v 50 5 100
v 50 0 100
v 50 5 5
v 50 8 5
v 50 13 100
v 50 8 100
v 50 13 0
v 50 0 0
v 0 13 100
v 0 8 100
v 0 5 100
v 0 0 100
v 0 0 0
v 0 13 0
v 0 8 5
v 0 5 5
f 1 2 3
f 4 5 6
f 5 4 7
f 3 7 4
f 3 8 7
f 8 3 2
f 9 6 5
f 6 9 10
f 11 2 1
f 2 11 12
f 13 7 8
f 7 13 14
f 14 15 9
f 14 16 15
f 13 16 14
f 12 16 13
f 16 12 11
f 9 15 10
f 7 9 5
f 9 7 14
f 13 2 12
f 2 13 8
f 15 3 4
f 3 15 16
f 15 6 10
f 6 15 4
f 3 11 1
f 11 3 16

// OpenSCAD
// width of the slot holding the paper - should be a little more than the paper thickness
slot_width= 3;

// height of the rail which holds the paper - this amount will invisible from the bottom part
rail_height = 100;
rail_length = 50;
rail_wall_width = 5;
rail_floor_height =5;

socket_hight=1000;


// A4 page
a4_length = 210;
a4_height = 297;


module a4_slot(){
    color("white")cube([a4_length,slot_width,a4_height]);
}

module rail(){
    difference(){
        cube([rail_length,2*rail_wall_width+slot_width,rail_height]);
        translate([-0.01,rail_wall_width,rail_floor_height])a4_slot();    
    }
    
}


rail();

//a4_slot();
